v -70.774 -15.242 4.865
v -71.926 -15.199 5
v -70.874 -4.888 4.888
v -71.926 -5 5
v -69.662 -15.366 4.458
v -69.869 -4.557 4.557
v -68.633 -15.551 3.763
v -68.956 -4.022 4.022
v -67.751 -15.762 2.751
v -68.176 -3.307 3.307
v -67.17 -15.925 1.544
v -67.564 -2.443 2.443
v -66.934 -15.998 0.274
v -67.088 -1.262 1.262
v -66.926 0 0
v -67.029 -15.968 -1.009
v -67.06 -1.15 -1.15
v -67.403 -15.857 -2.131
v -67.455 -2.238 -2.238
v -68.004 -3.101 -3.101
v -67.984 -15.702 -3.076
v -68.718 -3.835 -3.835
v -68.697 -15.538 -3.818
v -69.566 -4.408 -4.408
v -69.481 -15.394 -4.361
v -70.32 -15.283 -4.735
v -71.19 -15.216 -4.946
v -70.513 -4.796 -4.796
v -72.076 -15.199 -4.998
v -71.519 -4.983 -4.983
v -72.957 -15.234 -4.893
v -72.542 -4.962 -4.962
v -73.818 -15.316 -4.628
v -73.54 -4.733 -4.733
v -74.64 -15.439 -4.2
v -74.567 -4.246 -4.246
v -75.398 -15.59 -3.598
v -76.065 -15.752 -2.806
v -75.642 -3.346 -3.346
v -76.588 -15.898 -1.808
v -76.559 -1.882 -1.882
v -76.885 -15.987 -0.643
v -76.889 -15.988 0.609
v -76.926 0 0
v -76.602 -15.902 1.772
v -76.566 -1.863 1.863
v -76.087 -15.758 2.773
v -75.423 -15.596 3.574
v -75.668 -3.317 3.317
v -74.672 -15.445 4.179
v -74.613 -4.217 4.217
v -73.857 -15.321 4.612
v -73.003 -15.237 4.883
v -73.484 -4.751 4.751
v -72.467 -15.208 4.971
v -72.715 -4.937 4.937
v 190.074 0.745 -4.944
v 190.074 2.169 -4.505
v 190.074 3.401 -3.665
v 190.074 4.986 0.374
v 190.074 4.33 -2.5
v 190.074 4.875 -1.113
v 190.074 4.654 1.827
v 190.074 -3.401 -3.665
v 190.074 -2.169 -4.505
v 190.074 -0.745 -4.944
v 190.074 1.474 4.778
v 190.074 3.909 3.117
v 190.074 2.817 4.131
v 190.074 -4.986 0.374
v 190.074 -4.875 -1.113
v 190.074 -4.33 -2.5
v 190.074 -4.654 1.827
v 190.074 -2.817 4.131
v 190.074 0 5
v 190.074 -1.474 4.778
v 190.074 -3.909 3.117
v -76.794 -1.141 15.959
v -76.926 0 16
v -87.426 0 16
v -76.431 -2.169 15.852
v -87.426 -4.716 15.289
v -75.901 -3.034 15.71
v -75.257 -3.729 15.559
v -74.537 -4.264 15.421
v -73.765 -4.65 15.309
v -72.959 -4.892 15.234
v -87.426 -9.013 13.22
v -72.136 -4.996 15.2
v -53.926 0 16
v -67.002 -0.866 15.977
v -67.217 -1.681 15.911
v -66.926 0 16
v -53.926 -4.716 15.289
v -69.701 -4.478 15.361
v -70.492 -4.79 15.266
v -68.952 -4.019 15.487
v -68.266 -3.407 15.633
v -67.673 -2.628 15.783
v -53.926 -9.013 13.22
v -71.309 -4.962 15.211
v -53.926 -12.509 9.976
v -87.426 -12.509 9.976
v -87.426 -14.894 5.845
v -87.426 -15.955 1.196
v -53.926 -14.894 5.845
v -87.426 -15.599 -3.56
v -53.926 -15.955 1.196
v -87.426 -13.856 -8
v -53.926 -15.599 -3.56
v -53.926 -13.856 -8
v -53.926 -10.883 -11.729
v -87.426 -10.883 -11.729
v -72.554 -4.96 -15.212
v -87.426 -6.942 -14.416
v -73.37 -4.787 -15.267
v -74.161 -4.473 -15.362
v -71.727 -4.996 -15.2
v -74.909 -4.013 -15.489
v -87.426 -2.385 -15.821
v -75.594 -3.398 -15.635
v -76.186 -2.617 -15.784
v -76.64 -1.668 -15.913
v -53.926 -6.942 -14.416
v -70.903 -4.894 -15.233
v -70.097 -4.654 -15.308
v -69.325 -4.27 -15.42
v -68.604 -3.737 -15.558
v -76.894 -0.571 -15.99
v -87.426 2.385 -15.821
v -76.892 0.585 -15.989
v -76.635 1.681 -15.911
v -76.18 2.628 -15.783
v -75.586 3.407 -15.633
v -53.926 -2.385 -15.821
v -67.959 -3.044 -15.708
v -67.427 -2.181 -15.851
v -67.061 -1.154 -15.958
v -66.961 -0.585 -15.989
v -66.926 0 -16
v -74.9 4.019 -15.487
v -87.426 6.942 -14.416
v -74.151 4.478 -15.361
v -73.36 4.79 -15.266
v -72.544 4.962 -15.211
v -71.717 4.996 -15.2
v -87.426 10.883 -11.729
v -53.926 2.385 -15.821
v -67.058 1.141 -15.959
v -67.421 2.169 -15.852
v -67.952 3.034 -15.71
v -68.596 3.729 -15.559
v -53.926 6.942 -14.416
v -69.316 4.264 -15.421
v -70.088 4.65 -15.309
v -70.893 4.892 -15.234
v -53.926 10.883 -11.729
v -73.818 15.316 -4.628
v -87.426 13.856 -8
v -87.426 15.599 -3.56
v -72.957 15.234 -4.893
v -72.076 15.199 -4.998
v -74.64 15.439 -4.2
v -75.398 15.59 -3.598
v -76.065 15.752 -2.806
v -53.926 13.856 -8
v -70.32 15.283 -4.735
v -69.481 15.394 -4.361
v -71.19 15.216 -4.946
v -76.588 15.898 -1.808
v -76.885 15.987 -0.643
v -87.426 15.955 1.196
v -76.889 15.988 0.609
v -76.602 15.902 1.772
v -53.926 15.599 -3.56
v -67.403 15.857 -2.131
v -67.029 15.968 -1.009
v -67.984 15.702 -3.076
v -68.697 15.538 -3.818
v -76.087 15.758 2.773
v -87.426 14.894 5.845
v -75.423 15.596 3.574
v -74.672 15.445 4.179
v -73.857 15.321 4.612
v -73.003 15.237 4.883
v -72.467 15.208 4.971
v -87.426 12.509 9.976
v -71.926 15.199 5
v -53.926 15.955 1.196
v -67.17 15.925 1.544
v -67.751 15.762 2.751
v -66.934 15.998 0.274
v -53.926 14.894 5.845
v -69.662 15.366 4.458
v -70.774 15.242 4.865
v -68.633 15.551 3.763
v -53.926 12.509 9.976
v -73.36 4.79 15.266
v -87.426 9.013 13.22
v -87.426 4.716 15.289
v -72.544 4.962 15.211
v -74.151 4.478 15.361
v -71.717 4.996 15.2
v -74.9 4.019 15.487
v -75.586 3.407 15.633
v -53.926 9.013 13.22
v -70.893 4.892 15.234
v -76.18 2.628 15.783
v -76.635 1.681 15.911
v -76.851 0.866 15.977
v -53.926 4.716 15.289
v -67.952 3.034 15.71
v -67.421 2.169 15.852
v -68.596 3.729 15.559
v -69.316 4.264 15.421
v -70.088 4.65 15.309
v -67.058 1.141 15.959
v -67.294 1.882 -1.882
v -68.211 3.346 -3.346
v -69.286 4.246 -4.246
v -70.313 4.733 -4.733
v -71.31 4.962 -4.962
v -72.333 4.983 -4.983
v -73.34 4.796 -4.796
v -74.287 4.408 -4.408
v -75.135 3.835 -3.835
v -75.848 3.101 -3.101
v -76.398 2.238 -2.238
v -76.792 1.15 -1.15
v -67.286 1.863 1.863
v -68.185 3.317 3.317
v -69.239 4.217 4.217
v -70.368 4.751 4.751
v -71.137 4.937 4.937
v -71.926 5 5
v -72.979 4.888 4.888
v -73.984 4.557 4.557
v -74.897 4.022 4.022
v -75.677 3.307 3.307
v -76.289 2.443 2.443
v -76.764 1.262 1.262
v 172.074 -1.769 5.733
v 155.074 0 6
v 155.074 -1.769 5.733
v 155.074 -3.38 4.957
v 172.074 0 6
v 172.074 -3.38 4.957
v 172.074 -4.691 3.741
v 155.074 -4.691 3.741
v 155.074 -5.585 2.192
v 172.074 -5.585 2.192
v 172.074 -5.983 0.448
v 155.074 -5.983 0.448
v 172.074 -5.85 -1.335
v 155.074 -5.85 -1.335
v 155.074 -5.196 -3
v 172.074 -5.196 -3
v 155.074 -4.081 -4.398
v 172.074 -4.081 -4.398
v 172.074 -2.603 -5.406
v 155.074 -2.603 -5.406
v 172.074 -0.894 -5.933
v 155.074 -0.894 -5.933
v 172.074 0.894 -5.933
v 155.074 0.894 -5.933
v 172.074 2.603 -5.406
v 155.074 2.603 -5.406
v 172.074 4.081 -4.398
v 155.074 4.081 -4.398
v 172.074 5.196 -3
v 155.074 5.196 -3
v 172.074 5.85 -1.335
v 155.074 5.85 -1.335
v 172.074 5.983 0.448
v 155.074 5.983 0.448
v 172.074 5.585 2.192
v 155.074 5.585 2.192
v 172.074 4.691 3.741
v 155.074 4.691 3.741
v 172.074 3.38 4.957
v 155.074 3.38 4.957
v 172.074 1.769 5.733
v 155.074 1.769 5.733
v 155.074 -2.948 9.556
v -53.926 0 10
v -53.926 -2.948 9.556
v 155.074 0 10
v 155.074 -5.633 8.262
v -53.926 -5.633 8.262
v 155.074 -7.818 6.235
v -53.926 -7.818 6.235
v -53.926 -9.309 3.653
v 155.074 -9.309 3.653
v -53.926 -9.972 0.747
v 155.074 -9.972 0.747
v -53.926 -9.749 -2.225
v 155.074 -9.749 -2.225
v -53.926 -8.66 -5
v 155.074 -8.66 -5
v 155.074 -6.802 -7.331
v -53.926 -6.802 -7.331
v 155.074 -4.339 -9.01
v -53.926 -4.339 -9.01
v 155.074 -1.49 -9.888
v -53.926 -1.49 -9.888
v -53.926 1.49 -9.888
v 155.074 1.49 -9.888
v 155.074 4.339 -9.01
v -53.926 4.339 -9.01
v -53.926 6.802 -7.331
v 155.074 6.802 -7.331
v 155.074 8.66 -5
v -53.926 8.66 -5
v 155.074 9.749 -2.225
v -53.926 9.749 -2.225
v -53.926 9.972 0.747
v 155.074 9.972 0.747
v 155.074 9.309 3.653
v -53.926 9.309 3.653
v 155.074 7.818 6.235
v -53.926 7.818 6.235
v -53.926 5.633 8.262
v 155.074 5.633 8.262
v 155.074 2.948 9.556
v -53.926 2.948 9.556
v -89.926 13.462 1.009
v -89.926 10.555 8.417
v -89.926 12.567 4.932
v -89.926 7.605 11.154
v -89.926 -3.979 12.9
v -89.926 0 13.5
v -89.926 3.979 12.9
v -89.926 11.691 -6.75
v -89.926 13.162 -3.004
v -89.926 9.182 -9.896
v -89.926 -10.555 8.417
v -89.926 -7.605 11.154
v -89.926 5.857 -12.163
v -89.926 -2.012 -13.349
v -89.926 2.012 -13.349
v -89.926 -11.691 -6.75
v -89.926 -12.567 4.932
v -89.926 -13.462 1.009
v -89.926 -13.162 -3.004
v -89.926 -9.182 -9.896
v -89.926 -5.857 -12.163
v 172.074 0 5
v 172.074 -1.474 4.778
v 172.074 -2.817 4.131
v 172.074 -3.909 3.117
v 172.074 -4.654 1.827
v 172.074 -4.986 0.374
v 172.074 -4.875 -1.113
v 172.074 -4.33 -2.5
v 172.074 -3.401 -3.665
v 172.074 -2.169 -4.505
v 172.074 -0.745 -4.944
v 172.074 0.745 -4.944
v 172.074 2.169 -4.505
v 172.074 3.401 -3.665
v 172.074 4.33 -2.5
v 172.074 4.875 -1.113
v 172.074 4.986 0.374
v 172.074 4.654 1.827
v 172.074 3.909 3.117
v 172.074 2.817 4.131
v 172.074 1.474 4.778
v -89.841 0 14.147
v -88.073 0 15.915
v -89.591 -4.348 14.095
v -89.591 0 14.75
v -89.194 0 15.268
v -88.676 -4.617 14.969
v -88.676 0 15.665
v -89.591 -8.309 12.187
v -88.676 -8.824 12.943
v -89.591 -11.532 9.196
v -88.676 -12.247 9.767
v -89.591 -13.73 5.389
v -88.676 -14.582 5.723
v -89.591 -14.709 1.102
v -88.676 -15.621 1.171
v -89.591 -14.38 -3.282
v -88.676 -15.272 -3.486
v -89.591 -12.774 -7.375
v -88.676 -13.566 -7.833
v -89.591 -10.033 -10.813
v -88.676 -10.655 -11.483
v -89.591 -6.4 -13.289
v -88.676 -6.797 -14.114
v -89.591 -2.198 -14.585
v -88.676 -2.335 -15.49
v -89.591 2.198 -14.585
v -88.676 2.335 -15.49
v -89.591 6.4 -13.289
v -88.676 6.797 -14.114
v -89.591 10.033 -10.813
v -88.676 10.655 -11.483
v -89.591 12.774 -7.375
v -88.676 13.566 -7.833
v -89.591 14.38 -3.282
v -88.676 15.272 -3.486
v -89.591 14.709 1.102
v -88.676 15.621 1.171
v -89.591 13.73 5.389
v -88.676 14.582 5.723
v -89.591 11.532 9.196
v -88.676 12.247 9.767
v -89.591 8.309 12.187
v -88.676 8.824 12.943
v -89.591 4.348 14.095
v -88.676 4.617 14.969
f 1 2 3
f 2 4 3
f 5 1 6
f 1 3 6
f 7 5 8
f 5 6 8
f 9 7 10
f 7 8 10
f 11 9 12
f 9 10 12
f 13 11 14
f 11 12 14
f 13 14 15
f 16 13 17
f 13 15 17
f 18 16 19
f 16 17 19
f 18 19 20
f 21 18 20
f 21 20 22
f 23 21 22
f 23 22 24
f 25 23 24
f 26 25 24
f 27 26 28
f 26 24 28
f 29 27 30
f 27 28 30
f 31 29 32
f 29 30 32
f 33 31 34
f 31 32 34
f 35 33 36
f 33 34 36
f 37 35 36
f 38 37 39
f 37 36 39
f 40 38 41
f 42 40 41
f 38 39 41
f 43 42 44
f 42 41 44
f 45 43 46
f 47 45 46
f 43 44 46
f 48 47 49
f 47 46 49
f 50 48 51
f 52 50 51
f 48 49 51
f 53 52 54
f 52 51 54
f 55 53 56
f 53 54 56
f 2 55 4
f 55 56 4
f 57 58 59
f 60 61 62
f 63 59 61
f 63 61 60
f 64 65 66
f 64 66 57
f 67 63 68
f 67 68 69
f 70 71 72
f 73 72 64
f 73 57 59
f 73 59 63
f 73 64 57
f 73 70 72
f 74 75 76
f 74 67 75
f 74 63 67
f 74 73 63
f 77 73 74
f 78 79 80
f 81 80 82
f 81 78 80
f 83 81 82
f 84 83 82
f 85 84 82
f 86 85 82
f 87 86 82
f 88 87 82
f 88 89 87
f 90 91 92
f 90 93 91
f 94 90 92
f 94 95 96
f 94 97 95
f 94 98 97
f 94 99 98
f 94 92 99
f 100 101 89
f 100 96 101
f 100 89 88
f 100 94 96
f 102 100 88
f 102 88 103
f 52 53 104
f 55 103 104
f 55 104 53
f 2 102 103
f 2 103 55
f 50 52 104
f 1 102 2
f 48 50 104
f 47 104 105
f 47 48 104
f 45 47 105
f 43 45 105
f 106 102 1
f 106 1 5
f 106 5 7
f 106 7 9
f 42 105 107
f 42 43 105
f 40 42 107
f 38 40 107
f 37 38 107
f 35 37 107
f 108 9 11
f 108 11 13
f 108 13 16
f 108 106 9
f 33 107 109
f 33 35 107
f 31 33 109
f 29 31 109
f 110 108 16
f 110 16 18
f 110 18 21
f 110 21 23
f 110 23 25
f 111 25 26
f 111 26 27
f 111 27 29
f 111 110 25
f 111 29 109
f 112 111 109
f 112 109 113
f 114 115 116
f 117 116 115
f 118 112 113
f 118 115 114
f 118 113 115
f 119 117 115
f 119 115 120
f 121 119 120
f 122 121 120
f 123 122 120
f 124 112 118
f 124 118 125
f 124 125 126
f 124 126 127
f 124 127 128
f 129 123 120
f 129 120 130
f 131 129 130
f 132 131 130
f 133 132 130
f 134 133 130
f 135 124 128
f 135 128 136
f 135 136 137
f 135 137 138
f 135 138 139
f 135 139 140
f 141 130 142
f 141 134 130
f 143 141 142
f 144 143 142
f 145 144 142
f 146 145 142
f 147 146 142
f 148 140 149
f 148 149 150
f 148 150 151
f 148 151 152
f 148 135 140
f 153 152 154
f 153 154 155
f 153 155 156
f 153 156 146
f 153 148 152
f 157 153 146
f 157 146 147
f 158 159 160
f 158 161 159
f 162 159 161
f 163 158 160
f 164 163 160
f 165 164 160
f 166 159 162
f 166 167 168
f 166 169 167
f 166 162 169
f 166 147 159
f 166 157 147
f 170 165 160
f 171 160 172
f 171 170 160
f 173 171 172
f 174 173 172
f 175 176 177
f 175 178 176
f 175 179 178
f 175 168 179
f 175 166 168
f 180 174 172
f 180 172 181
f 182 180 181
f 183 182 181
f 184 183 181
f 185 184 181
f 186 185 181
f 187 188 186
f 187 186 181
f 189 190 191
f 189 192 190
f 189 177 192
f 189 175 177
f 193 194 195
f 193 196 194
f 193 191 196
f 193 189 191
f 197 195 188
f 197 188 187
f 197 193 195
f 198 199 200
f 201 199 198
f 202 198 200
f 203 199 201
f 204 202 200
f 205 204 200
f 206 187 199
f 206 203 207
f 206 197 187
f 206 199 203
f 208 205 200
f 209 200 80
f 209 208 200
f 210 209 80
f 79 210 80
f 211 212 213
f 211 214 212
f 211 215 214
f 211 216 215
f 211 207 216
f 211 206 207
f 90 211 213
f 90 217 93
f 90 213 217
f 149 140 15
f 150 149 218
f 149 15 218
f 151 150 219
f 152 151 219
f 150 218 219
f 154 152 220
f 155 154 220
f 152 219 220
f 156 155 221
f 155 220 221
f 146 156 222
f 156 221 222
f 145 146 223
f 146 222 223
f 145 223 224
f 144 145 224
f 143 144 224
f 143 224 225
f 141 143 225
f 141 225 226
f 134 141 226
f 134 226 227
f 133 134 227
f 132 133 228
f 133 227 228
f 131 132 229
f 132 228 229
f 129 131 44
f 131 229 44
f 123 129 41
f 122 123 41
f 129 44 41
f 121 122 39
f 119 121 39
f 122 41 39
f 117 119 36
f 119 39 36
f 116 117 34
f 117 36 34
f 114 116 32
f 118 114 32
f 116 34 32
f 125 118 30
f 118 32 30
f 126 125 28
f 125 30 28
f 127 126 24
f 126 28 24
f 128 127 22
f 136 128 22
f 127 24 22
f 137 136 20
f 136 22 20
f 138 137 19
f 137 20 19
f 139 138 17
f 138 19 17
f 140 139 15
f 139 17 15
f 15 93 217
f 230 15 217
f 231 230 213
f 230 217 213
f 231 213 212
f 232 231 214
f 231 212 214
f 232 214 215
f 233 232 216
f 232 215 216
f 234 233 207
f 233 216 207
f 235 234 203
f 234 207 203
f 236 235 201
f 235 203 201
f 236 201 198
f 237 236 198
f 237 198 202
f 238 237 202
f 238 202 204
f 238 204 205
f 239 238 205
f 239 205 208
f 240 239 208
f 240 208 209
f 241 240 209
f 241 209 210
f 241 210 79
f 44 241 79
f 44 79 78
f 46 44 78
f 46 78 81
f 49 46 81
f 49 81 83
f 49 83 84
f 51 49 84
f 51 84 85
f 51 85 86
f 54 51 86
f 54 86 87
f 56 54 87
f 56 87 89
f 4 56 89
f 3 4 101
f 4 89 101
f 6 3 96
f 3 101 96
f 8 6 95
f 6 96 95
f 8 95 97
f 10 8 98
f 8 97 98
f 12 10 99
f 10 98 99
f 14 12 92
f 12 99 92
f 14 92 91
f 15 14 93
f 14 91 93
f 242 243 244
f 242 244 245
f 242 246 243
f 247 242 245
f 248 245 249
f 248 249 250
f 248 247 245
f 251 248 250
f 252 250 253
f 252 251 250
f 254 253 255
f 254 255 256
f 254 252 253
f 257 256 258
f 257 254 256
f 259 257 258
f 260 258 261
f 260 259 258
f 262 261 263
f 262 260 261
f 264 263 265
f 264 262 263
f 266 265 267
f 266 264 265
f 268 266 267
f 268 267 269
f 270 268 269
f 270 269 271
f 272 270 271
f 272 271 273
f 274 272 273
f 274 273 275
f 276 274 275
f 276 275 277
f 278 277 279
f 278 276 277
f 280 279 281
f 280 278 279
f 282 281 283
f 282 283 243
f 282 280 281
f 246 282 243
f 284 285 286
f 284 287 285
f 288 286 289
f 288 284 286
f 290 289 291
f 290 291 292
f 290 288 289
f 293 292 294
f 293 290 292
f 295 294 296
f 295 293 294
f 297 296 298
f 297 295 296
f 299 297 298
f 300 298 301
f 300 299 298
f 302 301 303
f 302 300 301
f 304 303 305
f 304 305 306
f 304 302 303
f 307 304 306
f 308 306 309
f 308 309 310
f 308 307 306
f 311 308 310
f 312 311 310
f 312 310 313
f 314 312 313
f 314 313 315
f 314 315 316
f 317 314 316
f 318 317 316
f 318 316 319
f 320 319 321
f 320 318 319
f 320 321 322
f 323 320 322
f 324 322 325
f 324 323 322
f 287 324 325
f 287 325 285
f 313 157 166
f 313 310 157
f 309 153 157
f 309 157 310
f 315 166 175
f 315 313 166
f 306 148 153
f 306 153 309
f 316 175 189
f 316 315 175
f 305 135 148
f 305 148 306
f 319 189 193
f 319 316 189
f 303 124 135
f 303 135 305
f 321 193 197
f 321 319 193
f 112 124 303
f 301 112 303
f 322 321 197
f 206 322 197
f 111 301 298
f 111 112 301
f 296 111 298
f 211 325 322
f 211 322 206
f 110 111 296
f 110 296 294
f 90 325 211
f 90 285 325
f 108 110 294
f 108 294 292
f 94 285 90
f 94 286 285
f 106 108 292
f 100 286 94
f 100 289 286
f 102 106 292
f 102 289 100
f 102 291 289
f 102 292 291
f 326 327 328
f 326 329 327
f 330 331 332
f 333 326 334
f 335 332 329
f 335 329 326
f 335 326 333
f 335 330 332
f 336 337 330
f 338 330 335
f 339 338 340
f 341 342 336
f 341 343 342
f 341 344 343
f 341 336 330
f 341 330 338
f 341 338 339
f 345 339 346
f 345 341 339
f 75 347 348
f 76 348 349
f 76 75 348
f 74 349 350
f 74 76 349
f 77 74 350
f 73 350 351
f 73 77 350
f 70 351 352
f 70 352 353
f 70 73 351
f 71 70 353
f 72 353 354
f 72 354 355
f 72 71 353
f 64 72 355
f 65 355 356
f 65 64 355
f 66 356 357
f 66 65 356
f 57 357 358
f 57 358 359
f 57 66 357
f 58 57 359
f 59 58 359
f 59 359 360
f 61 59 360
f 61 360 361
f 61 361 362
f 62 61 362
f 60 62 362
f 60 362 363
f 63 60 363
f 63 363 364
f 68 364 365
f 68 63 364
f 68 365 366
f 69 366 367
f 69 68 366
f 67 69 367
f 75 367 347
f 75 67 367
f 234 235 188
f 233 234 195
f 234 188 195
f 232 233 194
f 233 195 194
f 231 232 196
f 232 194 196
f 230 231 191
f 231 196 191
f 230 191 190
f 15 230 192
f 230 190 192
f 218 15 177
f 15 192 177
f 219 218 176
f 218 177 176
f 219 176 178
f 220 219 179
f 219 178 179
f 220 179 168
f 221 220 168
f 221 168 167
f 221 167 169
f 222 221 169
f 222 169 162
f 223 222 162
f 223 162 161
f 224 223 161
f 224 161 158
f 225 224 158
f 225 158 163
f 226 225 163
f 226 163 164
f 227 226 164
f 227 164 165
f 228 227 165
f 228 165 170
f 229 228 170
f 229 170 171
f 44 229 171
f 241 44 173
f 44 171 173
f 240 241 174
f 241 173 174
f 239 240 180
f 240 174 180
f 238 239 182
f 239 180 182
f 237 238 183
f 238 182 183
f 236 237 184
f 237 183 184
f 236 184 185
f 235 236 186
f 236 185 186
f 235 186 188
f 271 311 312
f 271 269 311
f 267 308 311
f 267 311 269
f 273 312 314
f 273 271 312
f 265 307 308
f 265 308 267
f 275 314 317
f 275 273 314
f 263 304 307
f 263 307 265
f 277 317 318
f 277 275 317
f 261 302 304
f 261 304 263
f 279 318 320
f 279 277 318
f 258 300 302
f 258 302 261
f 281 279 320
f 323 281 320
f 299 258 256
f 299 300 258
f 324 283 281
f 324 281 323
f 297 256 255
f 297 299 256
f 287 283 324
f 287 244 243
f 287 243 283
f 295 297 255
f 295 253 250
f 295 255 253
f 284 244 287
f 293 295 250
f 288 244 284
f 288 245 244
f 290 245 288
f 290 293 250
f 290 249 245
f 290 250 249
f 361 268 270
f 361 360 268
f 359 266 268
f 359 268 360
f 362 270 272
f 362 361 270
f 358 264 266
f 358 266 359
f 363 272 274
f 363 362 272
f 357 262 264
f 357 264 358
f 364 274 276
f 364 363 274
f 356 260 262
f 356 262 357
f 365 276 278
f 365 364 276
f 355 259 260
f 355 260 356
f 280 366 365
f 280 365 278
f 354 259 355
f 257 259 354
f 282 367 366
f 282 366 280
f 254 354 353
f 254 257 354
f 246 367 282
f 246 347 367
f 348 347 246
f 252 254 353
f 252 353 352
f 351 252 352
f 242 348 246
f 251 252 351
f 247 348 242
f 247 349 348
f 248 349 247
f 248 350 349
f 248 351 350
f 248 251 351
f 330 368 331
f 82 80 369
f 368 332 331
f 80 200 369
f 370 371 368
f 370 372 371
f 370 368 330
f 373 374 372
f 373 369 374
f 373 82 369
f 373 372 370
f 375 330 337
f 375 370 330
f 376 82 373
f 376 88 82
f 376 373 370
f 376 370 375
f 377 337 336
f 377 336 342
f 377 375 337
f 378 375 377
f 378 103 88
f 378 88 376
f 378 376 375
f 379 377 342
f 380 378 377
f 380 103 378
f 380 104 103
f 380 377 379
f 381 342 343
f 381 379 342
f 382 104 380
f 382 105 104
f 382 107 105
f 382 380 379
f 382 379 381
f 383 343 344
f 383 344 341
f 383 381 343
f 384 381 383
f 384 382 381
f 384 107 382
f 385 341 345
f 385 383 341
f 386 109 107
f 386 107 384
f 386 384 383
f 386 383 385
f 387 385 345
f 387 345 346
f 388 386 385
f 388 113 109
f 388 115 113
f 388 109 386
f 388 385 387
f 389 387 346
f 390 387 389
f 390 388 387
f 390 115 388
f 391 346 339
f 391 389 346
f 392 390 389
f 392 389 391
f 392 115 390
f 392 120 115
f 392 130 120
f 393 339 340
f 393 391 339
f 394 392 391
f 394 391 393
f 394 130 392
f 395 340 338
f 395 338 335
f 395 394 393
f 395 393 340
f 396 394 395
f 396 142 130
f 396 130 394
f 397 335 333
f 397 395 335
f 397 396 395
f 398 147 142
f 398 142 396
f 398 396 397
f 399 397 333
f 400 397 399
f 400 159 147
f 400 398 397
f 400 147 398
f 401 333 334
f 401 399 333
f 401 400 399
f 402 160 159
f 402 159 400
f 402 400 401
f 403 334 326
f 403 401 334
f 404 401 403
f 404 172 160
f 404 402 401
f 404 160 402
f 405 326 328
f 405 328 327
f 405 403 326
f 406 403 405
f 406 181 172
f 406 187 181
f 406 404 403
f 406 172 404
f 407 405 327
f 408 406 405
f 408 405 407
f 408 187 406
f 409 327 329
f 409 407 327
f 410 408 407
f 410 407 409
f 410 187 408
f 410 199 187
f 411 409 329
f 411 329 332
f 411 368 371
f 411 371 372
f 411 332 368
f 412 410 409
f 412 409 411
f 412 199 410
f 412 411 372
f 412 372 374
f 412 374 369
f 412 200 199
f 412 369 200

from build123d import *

# Parameters (mm, degrees)
SKETCH3_R      = 5
EXTRUDE2_DEPTH = 20
SKETCH2_R      = 5
EXTRUDE3_DEPTH = 20


with BuildPart() as part:
    # Sketch1 → Revolve1 (revolve)
    with BuildSketch(Plane.XY, mode=Mode.PRIVATE) as revolve1_sk:
        with BuildLine():
            Line((-89.926247849, 0), (-89.926247849, 13.5))
            ThreePointArc((-89.926247849, 13.5), (-89.194014801, 15.267766953), (-87.426247849, 16))
            Line((-87.426247849, 16), (-53.926247849, 16))
            Line((-53.926247849, 16), (-53.926247849, 10))
            Line((-53.926247849, 10), (155.073752151, 10))
            Line((155.073752151, 10), (155.073752151, 6))
            Line((155.073752151, 6), (172.073752151, 6))
            Line((172.073752151, 6), (172.073752151, 5))
            Line((172.073752151, 5), (190.073752151, 5))
            Line((190.073752151, 5), (190.073752151, 0))
            Line((190.073752151, 0), (-89.926247849, 0))
        make_face()
    revolve(revolve1_sk.sketch.rotate(Axis((0, 0, 0), (1, 0, 0)), 90), axis=Axis((0, 0, 0), (1, 0, 0)))

    # Sketch3 → Extrude2 (cut, symmetric)
    with BuildSketch(Plane.XY):
        with Locations((-71.926247849, 0)):
            Circle(SKETCH3_R)
    extrude(amount=EXTRUDE2_DEPTH, both=True, mode=Mode.SUBTRACT)

    # Sketch2 → Extrude3 (cut, symmetric)
    with BuildSketch(Plane(origin=(0, 0, 0), x_dir=(1, 0, 0), z_dir=(0, 1, 0))):
        with Locations(Location((-71.926247849, 0, 0), (0, 0, 270))):
            Circle(SKETCH2_R)
    extrude(amount=EXTRUDE3_DEPTH, both=True, mode=Mode.SUBTRACT)


solid = part.part
